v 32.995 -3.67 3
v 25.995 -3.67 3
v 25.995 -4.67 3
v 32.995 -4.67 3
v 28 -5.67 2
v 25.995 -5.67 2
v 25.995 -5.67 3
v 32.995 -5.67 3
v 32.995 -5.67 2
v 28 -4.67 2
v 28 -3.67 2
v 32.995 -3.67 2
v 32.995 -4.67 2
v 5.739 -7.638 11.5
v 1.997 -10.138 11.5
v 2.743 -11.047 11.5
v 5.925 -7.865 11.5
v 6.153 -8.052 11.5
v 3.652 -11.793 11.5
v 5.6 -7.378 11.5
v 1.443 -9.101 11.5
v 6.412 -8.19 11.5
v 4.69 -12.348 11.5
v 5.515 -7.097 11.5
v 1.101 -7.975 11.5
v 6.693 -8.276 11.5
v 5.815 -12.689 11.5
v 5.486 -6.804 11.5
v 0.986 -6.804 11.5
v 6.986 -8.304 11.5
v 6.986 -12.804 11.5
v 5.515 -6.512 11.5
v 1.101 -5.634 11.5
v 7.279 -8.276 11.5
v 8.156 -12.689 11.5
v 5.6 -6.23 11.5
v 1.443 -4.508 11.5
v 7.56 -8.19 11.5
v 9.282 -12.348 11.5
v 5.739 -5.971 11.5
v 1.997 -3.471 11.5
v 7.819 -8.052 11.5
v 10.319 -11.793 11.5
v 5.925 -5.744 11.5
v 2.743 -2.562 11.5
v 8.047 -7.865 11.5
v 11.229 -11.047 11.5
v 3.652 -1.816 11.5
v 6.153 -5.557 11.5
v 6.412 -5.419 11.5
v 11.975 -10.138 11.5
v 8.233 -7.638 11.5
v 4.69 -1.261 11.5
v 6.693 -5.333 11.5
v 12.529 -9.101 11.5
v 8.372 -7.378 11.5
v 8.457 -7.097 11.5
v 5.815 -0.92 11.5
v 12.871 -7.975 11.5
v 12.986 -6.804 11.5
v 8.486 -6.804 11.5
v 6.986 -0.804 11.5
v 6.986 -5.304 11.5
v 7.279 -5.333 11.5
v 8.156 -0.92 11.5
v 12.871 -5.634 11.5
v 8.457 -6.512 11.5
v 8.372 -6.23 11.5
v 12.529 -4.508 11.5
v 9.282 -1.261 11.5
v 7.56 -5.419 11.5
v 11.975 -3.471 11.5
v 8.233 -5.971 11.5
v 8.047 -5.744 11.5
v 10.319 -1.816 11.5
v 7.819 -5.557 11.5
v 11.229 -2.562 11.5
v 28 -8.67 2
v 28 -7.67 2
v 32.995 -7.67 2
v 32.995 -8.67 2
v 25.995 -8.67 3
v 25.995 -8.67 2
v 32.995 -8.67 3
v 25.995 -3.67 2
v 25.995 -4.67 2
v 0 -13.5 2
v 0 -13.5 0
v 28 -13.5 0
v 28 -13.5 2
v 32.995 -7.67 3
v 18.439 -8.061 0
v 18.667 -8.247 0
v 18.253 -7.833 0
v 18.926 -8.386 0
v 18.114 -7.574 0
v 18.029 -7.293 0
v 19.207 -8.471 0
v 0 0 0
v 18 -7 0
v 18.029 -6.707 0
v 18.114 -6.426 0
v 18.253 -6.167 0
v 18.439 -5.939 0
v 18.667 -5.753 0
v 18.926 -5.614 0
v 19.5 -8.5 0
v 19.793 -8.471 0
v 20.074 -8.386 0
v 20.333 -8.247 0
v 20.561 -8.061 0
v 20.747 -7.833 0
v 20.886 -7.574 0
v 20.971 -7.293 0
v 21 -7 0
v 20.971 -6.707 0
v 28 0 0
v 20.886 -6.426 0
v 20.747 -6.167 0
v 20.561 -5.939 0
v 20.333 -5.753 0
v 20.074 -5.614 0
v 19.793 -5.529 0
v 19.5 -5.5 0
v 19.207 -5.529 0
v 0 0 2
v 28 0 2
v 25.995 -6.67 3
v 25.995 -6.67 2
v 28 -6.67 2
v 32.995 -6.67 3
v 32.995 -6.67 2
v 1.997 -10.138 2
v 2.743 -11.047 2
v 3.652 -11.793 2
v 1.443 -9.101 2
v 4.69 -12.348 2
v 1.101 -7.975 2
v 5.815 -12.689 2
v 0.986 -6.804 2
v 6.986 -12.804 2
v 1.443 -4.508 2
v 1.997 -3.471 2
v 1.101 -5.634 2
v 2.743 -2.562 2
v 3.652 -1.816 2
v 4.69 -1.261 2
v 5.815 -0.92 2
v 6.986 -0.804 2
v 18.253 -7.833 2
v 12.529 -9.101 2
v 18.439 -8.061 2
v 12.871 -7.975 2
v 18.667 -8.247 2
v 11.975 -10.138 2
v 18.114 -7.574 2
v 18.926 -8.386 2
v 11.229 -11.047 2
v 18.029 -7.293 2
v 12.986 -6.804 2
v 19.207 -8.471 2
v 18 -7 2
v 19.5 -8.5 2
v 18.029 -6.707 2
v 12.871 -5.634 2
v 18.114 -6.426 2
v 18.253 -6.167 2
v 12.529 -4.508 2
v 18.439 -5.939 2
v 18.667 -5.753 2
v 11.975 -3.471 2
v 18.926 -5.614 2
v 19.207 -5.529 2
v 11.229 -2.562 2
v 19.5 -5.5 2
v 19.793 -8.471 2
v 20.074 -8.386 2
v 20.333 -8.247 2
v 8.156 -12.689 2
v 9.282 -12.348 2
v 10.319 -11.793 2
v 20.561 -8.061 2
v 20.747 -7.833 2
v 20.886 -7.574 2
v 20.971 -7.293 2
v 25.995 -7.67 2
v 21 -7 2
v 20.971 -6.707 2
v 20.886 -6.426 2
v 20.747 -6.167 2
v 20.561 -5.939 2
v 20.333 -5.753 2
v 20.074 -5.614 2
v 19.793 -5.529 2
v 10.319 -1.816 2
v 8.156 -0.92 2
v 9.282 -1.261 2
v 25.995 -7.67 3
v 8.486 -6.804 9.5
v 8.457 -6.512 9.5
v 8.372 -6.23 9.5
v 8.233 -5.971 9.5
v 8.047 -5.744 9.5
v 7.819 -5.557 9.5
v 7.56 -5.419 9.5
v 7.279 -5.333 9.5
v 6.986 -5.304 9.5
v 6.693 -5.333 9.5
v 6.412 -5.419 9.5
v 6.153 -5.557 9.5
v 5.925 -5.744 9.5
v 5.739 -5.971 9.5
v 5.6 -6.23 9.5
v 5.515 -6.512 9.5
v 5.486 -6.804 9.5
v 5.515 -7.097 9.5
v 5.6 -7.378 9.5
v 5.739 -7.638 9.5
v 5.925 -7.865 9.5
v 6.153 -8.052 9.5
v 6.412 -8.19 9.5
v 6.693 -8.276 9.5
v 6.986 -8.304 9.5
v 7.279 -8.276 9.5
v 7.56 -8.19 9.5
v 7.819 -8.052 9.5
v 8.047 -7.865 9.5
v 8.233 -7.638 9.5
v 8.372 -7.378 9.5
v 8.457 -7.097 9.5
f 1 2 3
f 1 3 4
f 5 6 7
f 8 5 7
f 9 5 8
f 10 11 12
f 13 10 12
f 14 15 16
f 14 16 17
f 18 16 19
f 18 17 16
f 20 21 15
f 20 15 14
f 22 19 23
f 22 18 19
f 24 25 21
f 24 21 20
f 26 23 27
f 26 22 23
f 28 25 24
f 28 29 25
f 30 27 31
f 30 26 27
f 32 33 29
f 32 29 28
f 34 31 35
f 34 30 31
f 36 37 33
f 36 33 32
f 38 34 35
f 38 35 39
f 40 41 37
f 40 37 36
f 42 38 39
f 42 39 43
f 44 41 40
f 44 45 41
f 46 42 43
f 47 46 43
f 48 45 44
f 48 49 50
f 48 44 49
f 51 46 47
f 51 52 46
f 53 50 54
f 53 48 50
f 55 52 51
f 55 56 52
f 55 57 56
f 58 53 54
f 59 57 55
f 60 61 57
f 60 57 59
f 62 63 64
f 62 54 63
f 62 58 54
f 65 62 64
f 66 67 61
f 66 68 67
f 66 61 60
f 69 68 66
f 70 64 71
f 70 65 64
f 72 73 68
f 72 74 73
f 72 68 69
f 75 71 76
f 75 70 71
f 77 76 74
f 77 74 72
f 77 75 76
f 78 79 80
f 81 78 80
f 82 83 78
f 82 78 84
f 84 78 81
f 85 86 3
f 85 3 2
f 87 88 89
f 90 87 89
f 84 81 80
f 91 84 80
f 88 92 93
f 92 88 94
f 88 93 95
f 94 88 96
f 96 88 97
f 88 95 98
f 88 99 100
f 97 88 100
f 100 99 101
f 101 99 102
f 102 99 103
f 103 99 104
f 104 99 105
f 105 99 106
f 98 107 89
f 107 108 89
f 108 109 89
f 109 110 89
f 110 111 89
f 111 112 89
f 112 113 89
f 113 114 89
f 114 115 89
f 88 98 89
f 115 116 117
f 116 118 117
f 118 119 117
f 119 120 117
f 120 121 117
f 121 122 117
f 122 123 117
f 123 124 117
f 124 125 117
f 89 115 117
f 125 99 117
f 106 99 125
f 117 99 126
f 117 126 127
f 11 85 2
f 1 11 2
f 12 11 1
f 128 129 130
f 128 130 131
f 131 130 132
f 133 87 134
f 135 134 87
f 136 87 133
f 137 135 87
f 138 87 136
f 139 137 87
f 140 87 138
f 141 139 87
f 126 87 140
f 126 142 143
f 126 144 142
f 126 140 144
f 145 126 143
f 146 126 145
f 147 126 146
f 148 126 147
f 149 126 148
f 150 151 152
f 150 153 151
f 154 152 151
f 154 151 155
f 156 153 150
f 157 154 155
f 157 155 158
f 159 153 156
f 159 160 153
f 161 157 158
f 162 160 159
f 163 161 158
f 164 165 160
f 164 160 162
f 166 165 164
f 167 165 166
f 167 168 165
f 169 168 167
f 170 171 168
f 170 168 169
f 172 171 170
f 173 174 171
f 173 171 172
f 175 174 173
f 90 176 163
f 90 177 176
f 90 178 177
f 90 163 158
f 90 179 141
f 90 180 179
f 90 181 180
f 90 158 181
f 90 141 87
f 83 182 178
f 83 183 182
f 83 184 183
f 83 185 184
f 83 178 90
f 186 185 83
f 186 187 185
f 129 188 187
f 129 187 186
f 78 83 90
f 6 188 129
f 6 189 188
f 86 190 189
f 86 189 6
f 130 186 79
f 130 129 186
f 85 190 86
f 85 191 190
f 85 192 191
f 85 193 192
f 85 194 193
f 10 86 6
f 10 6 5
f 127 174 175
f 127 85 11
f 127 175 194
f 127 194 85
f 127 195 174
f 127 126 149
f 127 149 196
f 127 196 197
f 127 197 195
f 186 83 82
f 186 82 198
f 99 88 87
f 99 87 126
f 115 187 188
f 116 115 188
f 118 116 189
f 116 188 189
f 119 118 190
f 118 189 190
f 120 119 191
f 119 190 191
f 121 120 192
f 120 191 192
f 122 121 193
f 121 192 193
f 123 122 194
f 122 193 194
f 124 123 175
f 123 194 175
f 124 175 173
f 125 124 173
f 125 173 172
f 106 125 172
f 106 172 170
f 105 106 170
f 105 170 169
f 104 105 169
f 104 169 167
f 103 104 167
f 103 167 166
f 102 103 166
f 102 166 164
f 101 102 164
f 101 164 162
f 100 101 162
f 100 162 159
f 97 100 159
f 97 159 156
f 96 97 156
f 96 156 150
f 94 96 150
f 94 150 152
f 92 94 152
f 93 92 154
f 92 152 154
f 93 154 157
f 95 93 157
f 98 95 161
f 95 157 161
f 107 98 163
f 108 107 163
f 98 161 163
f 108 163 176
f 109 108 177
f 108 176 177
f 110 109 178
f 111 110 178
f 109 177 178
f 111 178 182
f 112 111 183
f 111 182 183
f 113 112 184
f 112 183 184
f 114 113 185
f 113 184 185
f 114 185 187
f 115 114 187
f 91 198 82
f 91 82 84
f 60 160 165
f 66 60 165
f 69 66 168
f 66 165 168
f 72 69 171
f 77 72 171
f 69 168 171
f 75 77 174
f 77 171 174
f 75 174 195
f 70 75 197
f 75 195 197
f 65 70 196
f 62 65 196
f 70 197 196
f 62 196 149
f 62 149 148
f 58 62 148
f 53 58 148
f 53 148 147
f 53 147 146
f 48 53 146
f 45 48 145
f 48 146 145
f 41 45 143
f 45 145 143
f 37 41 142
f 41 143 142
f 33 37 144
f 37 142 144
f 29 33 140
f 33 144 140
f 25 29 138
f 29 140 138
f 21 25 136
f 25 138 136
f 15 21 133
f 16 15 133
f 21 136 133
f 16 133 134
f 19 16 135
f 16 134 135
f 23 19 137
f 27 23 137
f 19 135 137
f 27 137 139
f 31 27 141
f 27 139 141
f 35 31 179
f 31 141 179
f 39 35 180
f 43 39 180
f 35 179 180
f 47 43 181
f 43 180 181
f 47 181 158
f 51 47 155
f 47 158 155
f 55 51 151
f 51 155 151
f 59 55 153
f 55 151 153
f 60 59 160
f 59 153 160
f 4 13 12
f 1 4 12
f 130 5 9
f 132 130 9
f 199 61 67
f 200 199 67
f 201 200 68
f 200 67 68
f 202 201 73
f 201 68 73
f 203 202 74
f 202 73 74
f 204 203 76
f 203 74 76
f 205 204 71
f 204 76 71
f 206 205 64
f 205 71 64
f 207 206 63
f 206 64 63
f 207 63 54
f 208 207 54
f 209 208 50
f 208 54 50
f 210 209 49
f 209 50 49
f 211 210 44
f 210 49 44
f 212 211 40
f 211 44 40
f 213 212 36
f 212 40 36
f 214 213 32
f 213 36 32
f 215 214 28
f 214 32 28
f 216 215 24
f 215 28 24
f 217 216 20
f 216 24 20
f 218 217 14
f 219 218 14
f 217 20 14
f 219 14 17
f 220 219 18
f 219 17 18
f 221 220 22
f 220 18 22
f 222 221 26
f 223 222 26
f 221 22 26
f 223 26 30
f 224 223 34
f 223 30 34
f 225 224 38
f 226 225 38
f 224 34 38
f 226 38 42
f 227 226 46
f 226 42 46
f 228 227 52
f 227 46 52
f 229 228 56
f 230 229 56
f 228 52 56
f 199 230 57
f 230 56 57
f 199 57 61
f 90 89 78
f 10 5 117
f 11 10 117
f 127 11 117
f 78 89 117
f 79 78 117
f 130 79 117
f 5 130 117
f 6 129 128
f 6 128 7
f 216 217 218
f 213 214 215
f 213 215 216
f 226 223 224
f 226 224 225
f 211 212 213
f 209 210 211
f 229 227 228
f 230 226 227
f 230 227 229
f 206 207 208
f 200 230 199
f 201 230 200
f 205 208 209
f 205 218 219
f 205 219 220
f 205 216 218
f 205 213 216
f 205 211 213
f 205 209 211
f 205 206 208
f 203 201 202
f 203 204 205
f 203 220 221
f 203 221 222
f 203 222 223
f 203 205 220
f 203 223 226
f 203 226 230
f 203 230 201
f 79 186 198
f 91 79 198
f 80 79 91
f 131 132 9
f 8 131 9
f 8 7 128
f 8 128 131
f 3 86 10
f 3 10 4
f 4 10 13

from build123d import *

# Parameters (mm, degrees)
F0_W     = 28
F0_H     = 13.5
F1_DEPTH = 2
F2_R     = 6
F3_DEPTH = 9.5
F4_R     = 1.5
F5_DEPTH = 2
F6_W     = 7
F6_H     = 1
F7_DEPTH = 1
F8_R     = 1.5
F9_DEPTH = 25


with BuildPart() as f1:
    # F0 (on Top) → F1 (new body)
    with BuildSketch(Plane.XY):
        with Locations((14, -6.75)):
            Rectangle(F0_W, F0_H)
    extrude(amount=F1_DEPTH)

    # F2 (on face) → F3 (join)
    with BuildSketch(Plane.XY.offset(2)):
        with Locations((6.98589, -6.804436)):
            Circle(F2_R)
    extrude(amount=F3_DEPTH)

    # F4 (on face) → F5 (cut)
    with BuildSketch(Plane.XY.offset(11.5)):
        with Locations((6.98589, -6.804436)):
            Circle(F4_R)
    extrude(amount=-F5_DEPTH, mode=Mode.SUBTRACT)

    # F6 (on face) → F7 (join)
    with BuildSketch(Plane.XY.offset(2)):
        with Locations((29.494992, -8.169937)):
            Rectangle(F6_W, F6_H)
        with Locations((29.494992, -6.169937)):
            Rectangle(F6_W, F6_H)
        with Locations((29.494992, -4.169937)):
            Rectangle(F6_W, F6_H)
    extrude(amount=F7_DEPTH)

    # F8 (on face) → F9 (cut)
    with BuildSketch(Plane.XY.offset(2)):
        with Locations((19.5, -7)):
            Circle(F8_R)
    extrude(amount=-F9_DEPTH, mode=Mode.SUBTRACT)


solid = f1.part
